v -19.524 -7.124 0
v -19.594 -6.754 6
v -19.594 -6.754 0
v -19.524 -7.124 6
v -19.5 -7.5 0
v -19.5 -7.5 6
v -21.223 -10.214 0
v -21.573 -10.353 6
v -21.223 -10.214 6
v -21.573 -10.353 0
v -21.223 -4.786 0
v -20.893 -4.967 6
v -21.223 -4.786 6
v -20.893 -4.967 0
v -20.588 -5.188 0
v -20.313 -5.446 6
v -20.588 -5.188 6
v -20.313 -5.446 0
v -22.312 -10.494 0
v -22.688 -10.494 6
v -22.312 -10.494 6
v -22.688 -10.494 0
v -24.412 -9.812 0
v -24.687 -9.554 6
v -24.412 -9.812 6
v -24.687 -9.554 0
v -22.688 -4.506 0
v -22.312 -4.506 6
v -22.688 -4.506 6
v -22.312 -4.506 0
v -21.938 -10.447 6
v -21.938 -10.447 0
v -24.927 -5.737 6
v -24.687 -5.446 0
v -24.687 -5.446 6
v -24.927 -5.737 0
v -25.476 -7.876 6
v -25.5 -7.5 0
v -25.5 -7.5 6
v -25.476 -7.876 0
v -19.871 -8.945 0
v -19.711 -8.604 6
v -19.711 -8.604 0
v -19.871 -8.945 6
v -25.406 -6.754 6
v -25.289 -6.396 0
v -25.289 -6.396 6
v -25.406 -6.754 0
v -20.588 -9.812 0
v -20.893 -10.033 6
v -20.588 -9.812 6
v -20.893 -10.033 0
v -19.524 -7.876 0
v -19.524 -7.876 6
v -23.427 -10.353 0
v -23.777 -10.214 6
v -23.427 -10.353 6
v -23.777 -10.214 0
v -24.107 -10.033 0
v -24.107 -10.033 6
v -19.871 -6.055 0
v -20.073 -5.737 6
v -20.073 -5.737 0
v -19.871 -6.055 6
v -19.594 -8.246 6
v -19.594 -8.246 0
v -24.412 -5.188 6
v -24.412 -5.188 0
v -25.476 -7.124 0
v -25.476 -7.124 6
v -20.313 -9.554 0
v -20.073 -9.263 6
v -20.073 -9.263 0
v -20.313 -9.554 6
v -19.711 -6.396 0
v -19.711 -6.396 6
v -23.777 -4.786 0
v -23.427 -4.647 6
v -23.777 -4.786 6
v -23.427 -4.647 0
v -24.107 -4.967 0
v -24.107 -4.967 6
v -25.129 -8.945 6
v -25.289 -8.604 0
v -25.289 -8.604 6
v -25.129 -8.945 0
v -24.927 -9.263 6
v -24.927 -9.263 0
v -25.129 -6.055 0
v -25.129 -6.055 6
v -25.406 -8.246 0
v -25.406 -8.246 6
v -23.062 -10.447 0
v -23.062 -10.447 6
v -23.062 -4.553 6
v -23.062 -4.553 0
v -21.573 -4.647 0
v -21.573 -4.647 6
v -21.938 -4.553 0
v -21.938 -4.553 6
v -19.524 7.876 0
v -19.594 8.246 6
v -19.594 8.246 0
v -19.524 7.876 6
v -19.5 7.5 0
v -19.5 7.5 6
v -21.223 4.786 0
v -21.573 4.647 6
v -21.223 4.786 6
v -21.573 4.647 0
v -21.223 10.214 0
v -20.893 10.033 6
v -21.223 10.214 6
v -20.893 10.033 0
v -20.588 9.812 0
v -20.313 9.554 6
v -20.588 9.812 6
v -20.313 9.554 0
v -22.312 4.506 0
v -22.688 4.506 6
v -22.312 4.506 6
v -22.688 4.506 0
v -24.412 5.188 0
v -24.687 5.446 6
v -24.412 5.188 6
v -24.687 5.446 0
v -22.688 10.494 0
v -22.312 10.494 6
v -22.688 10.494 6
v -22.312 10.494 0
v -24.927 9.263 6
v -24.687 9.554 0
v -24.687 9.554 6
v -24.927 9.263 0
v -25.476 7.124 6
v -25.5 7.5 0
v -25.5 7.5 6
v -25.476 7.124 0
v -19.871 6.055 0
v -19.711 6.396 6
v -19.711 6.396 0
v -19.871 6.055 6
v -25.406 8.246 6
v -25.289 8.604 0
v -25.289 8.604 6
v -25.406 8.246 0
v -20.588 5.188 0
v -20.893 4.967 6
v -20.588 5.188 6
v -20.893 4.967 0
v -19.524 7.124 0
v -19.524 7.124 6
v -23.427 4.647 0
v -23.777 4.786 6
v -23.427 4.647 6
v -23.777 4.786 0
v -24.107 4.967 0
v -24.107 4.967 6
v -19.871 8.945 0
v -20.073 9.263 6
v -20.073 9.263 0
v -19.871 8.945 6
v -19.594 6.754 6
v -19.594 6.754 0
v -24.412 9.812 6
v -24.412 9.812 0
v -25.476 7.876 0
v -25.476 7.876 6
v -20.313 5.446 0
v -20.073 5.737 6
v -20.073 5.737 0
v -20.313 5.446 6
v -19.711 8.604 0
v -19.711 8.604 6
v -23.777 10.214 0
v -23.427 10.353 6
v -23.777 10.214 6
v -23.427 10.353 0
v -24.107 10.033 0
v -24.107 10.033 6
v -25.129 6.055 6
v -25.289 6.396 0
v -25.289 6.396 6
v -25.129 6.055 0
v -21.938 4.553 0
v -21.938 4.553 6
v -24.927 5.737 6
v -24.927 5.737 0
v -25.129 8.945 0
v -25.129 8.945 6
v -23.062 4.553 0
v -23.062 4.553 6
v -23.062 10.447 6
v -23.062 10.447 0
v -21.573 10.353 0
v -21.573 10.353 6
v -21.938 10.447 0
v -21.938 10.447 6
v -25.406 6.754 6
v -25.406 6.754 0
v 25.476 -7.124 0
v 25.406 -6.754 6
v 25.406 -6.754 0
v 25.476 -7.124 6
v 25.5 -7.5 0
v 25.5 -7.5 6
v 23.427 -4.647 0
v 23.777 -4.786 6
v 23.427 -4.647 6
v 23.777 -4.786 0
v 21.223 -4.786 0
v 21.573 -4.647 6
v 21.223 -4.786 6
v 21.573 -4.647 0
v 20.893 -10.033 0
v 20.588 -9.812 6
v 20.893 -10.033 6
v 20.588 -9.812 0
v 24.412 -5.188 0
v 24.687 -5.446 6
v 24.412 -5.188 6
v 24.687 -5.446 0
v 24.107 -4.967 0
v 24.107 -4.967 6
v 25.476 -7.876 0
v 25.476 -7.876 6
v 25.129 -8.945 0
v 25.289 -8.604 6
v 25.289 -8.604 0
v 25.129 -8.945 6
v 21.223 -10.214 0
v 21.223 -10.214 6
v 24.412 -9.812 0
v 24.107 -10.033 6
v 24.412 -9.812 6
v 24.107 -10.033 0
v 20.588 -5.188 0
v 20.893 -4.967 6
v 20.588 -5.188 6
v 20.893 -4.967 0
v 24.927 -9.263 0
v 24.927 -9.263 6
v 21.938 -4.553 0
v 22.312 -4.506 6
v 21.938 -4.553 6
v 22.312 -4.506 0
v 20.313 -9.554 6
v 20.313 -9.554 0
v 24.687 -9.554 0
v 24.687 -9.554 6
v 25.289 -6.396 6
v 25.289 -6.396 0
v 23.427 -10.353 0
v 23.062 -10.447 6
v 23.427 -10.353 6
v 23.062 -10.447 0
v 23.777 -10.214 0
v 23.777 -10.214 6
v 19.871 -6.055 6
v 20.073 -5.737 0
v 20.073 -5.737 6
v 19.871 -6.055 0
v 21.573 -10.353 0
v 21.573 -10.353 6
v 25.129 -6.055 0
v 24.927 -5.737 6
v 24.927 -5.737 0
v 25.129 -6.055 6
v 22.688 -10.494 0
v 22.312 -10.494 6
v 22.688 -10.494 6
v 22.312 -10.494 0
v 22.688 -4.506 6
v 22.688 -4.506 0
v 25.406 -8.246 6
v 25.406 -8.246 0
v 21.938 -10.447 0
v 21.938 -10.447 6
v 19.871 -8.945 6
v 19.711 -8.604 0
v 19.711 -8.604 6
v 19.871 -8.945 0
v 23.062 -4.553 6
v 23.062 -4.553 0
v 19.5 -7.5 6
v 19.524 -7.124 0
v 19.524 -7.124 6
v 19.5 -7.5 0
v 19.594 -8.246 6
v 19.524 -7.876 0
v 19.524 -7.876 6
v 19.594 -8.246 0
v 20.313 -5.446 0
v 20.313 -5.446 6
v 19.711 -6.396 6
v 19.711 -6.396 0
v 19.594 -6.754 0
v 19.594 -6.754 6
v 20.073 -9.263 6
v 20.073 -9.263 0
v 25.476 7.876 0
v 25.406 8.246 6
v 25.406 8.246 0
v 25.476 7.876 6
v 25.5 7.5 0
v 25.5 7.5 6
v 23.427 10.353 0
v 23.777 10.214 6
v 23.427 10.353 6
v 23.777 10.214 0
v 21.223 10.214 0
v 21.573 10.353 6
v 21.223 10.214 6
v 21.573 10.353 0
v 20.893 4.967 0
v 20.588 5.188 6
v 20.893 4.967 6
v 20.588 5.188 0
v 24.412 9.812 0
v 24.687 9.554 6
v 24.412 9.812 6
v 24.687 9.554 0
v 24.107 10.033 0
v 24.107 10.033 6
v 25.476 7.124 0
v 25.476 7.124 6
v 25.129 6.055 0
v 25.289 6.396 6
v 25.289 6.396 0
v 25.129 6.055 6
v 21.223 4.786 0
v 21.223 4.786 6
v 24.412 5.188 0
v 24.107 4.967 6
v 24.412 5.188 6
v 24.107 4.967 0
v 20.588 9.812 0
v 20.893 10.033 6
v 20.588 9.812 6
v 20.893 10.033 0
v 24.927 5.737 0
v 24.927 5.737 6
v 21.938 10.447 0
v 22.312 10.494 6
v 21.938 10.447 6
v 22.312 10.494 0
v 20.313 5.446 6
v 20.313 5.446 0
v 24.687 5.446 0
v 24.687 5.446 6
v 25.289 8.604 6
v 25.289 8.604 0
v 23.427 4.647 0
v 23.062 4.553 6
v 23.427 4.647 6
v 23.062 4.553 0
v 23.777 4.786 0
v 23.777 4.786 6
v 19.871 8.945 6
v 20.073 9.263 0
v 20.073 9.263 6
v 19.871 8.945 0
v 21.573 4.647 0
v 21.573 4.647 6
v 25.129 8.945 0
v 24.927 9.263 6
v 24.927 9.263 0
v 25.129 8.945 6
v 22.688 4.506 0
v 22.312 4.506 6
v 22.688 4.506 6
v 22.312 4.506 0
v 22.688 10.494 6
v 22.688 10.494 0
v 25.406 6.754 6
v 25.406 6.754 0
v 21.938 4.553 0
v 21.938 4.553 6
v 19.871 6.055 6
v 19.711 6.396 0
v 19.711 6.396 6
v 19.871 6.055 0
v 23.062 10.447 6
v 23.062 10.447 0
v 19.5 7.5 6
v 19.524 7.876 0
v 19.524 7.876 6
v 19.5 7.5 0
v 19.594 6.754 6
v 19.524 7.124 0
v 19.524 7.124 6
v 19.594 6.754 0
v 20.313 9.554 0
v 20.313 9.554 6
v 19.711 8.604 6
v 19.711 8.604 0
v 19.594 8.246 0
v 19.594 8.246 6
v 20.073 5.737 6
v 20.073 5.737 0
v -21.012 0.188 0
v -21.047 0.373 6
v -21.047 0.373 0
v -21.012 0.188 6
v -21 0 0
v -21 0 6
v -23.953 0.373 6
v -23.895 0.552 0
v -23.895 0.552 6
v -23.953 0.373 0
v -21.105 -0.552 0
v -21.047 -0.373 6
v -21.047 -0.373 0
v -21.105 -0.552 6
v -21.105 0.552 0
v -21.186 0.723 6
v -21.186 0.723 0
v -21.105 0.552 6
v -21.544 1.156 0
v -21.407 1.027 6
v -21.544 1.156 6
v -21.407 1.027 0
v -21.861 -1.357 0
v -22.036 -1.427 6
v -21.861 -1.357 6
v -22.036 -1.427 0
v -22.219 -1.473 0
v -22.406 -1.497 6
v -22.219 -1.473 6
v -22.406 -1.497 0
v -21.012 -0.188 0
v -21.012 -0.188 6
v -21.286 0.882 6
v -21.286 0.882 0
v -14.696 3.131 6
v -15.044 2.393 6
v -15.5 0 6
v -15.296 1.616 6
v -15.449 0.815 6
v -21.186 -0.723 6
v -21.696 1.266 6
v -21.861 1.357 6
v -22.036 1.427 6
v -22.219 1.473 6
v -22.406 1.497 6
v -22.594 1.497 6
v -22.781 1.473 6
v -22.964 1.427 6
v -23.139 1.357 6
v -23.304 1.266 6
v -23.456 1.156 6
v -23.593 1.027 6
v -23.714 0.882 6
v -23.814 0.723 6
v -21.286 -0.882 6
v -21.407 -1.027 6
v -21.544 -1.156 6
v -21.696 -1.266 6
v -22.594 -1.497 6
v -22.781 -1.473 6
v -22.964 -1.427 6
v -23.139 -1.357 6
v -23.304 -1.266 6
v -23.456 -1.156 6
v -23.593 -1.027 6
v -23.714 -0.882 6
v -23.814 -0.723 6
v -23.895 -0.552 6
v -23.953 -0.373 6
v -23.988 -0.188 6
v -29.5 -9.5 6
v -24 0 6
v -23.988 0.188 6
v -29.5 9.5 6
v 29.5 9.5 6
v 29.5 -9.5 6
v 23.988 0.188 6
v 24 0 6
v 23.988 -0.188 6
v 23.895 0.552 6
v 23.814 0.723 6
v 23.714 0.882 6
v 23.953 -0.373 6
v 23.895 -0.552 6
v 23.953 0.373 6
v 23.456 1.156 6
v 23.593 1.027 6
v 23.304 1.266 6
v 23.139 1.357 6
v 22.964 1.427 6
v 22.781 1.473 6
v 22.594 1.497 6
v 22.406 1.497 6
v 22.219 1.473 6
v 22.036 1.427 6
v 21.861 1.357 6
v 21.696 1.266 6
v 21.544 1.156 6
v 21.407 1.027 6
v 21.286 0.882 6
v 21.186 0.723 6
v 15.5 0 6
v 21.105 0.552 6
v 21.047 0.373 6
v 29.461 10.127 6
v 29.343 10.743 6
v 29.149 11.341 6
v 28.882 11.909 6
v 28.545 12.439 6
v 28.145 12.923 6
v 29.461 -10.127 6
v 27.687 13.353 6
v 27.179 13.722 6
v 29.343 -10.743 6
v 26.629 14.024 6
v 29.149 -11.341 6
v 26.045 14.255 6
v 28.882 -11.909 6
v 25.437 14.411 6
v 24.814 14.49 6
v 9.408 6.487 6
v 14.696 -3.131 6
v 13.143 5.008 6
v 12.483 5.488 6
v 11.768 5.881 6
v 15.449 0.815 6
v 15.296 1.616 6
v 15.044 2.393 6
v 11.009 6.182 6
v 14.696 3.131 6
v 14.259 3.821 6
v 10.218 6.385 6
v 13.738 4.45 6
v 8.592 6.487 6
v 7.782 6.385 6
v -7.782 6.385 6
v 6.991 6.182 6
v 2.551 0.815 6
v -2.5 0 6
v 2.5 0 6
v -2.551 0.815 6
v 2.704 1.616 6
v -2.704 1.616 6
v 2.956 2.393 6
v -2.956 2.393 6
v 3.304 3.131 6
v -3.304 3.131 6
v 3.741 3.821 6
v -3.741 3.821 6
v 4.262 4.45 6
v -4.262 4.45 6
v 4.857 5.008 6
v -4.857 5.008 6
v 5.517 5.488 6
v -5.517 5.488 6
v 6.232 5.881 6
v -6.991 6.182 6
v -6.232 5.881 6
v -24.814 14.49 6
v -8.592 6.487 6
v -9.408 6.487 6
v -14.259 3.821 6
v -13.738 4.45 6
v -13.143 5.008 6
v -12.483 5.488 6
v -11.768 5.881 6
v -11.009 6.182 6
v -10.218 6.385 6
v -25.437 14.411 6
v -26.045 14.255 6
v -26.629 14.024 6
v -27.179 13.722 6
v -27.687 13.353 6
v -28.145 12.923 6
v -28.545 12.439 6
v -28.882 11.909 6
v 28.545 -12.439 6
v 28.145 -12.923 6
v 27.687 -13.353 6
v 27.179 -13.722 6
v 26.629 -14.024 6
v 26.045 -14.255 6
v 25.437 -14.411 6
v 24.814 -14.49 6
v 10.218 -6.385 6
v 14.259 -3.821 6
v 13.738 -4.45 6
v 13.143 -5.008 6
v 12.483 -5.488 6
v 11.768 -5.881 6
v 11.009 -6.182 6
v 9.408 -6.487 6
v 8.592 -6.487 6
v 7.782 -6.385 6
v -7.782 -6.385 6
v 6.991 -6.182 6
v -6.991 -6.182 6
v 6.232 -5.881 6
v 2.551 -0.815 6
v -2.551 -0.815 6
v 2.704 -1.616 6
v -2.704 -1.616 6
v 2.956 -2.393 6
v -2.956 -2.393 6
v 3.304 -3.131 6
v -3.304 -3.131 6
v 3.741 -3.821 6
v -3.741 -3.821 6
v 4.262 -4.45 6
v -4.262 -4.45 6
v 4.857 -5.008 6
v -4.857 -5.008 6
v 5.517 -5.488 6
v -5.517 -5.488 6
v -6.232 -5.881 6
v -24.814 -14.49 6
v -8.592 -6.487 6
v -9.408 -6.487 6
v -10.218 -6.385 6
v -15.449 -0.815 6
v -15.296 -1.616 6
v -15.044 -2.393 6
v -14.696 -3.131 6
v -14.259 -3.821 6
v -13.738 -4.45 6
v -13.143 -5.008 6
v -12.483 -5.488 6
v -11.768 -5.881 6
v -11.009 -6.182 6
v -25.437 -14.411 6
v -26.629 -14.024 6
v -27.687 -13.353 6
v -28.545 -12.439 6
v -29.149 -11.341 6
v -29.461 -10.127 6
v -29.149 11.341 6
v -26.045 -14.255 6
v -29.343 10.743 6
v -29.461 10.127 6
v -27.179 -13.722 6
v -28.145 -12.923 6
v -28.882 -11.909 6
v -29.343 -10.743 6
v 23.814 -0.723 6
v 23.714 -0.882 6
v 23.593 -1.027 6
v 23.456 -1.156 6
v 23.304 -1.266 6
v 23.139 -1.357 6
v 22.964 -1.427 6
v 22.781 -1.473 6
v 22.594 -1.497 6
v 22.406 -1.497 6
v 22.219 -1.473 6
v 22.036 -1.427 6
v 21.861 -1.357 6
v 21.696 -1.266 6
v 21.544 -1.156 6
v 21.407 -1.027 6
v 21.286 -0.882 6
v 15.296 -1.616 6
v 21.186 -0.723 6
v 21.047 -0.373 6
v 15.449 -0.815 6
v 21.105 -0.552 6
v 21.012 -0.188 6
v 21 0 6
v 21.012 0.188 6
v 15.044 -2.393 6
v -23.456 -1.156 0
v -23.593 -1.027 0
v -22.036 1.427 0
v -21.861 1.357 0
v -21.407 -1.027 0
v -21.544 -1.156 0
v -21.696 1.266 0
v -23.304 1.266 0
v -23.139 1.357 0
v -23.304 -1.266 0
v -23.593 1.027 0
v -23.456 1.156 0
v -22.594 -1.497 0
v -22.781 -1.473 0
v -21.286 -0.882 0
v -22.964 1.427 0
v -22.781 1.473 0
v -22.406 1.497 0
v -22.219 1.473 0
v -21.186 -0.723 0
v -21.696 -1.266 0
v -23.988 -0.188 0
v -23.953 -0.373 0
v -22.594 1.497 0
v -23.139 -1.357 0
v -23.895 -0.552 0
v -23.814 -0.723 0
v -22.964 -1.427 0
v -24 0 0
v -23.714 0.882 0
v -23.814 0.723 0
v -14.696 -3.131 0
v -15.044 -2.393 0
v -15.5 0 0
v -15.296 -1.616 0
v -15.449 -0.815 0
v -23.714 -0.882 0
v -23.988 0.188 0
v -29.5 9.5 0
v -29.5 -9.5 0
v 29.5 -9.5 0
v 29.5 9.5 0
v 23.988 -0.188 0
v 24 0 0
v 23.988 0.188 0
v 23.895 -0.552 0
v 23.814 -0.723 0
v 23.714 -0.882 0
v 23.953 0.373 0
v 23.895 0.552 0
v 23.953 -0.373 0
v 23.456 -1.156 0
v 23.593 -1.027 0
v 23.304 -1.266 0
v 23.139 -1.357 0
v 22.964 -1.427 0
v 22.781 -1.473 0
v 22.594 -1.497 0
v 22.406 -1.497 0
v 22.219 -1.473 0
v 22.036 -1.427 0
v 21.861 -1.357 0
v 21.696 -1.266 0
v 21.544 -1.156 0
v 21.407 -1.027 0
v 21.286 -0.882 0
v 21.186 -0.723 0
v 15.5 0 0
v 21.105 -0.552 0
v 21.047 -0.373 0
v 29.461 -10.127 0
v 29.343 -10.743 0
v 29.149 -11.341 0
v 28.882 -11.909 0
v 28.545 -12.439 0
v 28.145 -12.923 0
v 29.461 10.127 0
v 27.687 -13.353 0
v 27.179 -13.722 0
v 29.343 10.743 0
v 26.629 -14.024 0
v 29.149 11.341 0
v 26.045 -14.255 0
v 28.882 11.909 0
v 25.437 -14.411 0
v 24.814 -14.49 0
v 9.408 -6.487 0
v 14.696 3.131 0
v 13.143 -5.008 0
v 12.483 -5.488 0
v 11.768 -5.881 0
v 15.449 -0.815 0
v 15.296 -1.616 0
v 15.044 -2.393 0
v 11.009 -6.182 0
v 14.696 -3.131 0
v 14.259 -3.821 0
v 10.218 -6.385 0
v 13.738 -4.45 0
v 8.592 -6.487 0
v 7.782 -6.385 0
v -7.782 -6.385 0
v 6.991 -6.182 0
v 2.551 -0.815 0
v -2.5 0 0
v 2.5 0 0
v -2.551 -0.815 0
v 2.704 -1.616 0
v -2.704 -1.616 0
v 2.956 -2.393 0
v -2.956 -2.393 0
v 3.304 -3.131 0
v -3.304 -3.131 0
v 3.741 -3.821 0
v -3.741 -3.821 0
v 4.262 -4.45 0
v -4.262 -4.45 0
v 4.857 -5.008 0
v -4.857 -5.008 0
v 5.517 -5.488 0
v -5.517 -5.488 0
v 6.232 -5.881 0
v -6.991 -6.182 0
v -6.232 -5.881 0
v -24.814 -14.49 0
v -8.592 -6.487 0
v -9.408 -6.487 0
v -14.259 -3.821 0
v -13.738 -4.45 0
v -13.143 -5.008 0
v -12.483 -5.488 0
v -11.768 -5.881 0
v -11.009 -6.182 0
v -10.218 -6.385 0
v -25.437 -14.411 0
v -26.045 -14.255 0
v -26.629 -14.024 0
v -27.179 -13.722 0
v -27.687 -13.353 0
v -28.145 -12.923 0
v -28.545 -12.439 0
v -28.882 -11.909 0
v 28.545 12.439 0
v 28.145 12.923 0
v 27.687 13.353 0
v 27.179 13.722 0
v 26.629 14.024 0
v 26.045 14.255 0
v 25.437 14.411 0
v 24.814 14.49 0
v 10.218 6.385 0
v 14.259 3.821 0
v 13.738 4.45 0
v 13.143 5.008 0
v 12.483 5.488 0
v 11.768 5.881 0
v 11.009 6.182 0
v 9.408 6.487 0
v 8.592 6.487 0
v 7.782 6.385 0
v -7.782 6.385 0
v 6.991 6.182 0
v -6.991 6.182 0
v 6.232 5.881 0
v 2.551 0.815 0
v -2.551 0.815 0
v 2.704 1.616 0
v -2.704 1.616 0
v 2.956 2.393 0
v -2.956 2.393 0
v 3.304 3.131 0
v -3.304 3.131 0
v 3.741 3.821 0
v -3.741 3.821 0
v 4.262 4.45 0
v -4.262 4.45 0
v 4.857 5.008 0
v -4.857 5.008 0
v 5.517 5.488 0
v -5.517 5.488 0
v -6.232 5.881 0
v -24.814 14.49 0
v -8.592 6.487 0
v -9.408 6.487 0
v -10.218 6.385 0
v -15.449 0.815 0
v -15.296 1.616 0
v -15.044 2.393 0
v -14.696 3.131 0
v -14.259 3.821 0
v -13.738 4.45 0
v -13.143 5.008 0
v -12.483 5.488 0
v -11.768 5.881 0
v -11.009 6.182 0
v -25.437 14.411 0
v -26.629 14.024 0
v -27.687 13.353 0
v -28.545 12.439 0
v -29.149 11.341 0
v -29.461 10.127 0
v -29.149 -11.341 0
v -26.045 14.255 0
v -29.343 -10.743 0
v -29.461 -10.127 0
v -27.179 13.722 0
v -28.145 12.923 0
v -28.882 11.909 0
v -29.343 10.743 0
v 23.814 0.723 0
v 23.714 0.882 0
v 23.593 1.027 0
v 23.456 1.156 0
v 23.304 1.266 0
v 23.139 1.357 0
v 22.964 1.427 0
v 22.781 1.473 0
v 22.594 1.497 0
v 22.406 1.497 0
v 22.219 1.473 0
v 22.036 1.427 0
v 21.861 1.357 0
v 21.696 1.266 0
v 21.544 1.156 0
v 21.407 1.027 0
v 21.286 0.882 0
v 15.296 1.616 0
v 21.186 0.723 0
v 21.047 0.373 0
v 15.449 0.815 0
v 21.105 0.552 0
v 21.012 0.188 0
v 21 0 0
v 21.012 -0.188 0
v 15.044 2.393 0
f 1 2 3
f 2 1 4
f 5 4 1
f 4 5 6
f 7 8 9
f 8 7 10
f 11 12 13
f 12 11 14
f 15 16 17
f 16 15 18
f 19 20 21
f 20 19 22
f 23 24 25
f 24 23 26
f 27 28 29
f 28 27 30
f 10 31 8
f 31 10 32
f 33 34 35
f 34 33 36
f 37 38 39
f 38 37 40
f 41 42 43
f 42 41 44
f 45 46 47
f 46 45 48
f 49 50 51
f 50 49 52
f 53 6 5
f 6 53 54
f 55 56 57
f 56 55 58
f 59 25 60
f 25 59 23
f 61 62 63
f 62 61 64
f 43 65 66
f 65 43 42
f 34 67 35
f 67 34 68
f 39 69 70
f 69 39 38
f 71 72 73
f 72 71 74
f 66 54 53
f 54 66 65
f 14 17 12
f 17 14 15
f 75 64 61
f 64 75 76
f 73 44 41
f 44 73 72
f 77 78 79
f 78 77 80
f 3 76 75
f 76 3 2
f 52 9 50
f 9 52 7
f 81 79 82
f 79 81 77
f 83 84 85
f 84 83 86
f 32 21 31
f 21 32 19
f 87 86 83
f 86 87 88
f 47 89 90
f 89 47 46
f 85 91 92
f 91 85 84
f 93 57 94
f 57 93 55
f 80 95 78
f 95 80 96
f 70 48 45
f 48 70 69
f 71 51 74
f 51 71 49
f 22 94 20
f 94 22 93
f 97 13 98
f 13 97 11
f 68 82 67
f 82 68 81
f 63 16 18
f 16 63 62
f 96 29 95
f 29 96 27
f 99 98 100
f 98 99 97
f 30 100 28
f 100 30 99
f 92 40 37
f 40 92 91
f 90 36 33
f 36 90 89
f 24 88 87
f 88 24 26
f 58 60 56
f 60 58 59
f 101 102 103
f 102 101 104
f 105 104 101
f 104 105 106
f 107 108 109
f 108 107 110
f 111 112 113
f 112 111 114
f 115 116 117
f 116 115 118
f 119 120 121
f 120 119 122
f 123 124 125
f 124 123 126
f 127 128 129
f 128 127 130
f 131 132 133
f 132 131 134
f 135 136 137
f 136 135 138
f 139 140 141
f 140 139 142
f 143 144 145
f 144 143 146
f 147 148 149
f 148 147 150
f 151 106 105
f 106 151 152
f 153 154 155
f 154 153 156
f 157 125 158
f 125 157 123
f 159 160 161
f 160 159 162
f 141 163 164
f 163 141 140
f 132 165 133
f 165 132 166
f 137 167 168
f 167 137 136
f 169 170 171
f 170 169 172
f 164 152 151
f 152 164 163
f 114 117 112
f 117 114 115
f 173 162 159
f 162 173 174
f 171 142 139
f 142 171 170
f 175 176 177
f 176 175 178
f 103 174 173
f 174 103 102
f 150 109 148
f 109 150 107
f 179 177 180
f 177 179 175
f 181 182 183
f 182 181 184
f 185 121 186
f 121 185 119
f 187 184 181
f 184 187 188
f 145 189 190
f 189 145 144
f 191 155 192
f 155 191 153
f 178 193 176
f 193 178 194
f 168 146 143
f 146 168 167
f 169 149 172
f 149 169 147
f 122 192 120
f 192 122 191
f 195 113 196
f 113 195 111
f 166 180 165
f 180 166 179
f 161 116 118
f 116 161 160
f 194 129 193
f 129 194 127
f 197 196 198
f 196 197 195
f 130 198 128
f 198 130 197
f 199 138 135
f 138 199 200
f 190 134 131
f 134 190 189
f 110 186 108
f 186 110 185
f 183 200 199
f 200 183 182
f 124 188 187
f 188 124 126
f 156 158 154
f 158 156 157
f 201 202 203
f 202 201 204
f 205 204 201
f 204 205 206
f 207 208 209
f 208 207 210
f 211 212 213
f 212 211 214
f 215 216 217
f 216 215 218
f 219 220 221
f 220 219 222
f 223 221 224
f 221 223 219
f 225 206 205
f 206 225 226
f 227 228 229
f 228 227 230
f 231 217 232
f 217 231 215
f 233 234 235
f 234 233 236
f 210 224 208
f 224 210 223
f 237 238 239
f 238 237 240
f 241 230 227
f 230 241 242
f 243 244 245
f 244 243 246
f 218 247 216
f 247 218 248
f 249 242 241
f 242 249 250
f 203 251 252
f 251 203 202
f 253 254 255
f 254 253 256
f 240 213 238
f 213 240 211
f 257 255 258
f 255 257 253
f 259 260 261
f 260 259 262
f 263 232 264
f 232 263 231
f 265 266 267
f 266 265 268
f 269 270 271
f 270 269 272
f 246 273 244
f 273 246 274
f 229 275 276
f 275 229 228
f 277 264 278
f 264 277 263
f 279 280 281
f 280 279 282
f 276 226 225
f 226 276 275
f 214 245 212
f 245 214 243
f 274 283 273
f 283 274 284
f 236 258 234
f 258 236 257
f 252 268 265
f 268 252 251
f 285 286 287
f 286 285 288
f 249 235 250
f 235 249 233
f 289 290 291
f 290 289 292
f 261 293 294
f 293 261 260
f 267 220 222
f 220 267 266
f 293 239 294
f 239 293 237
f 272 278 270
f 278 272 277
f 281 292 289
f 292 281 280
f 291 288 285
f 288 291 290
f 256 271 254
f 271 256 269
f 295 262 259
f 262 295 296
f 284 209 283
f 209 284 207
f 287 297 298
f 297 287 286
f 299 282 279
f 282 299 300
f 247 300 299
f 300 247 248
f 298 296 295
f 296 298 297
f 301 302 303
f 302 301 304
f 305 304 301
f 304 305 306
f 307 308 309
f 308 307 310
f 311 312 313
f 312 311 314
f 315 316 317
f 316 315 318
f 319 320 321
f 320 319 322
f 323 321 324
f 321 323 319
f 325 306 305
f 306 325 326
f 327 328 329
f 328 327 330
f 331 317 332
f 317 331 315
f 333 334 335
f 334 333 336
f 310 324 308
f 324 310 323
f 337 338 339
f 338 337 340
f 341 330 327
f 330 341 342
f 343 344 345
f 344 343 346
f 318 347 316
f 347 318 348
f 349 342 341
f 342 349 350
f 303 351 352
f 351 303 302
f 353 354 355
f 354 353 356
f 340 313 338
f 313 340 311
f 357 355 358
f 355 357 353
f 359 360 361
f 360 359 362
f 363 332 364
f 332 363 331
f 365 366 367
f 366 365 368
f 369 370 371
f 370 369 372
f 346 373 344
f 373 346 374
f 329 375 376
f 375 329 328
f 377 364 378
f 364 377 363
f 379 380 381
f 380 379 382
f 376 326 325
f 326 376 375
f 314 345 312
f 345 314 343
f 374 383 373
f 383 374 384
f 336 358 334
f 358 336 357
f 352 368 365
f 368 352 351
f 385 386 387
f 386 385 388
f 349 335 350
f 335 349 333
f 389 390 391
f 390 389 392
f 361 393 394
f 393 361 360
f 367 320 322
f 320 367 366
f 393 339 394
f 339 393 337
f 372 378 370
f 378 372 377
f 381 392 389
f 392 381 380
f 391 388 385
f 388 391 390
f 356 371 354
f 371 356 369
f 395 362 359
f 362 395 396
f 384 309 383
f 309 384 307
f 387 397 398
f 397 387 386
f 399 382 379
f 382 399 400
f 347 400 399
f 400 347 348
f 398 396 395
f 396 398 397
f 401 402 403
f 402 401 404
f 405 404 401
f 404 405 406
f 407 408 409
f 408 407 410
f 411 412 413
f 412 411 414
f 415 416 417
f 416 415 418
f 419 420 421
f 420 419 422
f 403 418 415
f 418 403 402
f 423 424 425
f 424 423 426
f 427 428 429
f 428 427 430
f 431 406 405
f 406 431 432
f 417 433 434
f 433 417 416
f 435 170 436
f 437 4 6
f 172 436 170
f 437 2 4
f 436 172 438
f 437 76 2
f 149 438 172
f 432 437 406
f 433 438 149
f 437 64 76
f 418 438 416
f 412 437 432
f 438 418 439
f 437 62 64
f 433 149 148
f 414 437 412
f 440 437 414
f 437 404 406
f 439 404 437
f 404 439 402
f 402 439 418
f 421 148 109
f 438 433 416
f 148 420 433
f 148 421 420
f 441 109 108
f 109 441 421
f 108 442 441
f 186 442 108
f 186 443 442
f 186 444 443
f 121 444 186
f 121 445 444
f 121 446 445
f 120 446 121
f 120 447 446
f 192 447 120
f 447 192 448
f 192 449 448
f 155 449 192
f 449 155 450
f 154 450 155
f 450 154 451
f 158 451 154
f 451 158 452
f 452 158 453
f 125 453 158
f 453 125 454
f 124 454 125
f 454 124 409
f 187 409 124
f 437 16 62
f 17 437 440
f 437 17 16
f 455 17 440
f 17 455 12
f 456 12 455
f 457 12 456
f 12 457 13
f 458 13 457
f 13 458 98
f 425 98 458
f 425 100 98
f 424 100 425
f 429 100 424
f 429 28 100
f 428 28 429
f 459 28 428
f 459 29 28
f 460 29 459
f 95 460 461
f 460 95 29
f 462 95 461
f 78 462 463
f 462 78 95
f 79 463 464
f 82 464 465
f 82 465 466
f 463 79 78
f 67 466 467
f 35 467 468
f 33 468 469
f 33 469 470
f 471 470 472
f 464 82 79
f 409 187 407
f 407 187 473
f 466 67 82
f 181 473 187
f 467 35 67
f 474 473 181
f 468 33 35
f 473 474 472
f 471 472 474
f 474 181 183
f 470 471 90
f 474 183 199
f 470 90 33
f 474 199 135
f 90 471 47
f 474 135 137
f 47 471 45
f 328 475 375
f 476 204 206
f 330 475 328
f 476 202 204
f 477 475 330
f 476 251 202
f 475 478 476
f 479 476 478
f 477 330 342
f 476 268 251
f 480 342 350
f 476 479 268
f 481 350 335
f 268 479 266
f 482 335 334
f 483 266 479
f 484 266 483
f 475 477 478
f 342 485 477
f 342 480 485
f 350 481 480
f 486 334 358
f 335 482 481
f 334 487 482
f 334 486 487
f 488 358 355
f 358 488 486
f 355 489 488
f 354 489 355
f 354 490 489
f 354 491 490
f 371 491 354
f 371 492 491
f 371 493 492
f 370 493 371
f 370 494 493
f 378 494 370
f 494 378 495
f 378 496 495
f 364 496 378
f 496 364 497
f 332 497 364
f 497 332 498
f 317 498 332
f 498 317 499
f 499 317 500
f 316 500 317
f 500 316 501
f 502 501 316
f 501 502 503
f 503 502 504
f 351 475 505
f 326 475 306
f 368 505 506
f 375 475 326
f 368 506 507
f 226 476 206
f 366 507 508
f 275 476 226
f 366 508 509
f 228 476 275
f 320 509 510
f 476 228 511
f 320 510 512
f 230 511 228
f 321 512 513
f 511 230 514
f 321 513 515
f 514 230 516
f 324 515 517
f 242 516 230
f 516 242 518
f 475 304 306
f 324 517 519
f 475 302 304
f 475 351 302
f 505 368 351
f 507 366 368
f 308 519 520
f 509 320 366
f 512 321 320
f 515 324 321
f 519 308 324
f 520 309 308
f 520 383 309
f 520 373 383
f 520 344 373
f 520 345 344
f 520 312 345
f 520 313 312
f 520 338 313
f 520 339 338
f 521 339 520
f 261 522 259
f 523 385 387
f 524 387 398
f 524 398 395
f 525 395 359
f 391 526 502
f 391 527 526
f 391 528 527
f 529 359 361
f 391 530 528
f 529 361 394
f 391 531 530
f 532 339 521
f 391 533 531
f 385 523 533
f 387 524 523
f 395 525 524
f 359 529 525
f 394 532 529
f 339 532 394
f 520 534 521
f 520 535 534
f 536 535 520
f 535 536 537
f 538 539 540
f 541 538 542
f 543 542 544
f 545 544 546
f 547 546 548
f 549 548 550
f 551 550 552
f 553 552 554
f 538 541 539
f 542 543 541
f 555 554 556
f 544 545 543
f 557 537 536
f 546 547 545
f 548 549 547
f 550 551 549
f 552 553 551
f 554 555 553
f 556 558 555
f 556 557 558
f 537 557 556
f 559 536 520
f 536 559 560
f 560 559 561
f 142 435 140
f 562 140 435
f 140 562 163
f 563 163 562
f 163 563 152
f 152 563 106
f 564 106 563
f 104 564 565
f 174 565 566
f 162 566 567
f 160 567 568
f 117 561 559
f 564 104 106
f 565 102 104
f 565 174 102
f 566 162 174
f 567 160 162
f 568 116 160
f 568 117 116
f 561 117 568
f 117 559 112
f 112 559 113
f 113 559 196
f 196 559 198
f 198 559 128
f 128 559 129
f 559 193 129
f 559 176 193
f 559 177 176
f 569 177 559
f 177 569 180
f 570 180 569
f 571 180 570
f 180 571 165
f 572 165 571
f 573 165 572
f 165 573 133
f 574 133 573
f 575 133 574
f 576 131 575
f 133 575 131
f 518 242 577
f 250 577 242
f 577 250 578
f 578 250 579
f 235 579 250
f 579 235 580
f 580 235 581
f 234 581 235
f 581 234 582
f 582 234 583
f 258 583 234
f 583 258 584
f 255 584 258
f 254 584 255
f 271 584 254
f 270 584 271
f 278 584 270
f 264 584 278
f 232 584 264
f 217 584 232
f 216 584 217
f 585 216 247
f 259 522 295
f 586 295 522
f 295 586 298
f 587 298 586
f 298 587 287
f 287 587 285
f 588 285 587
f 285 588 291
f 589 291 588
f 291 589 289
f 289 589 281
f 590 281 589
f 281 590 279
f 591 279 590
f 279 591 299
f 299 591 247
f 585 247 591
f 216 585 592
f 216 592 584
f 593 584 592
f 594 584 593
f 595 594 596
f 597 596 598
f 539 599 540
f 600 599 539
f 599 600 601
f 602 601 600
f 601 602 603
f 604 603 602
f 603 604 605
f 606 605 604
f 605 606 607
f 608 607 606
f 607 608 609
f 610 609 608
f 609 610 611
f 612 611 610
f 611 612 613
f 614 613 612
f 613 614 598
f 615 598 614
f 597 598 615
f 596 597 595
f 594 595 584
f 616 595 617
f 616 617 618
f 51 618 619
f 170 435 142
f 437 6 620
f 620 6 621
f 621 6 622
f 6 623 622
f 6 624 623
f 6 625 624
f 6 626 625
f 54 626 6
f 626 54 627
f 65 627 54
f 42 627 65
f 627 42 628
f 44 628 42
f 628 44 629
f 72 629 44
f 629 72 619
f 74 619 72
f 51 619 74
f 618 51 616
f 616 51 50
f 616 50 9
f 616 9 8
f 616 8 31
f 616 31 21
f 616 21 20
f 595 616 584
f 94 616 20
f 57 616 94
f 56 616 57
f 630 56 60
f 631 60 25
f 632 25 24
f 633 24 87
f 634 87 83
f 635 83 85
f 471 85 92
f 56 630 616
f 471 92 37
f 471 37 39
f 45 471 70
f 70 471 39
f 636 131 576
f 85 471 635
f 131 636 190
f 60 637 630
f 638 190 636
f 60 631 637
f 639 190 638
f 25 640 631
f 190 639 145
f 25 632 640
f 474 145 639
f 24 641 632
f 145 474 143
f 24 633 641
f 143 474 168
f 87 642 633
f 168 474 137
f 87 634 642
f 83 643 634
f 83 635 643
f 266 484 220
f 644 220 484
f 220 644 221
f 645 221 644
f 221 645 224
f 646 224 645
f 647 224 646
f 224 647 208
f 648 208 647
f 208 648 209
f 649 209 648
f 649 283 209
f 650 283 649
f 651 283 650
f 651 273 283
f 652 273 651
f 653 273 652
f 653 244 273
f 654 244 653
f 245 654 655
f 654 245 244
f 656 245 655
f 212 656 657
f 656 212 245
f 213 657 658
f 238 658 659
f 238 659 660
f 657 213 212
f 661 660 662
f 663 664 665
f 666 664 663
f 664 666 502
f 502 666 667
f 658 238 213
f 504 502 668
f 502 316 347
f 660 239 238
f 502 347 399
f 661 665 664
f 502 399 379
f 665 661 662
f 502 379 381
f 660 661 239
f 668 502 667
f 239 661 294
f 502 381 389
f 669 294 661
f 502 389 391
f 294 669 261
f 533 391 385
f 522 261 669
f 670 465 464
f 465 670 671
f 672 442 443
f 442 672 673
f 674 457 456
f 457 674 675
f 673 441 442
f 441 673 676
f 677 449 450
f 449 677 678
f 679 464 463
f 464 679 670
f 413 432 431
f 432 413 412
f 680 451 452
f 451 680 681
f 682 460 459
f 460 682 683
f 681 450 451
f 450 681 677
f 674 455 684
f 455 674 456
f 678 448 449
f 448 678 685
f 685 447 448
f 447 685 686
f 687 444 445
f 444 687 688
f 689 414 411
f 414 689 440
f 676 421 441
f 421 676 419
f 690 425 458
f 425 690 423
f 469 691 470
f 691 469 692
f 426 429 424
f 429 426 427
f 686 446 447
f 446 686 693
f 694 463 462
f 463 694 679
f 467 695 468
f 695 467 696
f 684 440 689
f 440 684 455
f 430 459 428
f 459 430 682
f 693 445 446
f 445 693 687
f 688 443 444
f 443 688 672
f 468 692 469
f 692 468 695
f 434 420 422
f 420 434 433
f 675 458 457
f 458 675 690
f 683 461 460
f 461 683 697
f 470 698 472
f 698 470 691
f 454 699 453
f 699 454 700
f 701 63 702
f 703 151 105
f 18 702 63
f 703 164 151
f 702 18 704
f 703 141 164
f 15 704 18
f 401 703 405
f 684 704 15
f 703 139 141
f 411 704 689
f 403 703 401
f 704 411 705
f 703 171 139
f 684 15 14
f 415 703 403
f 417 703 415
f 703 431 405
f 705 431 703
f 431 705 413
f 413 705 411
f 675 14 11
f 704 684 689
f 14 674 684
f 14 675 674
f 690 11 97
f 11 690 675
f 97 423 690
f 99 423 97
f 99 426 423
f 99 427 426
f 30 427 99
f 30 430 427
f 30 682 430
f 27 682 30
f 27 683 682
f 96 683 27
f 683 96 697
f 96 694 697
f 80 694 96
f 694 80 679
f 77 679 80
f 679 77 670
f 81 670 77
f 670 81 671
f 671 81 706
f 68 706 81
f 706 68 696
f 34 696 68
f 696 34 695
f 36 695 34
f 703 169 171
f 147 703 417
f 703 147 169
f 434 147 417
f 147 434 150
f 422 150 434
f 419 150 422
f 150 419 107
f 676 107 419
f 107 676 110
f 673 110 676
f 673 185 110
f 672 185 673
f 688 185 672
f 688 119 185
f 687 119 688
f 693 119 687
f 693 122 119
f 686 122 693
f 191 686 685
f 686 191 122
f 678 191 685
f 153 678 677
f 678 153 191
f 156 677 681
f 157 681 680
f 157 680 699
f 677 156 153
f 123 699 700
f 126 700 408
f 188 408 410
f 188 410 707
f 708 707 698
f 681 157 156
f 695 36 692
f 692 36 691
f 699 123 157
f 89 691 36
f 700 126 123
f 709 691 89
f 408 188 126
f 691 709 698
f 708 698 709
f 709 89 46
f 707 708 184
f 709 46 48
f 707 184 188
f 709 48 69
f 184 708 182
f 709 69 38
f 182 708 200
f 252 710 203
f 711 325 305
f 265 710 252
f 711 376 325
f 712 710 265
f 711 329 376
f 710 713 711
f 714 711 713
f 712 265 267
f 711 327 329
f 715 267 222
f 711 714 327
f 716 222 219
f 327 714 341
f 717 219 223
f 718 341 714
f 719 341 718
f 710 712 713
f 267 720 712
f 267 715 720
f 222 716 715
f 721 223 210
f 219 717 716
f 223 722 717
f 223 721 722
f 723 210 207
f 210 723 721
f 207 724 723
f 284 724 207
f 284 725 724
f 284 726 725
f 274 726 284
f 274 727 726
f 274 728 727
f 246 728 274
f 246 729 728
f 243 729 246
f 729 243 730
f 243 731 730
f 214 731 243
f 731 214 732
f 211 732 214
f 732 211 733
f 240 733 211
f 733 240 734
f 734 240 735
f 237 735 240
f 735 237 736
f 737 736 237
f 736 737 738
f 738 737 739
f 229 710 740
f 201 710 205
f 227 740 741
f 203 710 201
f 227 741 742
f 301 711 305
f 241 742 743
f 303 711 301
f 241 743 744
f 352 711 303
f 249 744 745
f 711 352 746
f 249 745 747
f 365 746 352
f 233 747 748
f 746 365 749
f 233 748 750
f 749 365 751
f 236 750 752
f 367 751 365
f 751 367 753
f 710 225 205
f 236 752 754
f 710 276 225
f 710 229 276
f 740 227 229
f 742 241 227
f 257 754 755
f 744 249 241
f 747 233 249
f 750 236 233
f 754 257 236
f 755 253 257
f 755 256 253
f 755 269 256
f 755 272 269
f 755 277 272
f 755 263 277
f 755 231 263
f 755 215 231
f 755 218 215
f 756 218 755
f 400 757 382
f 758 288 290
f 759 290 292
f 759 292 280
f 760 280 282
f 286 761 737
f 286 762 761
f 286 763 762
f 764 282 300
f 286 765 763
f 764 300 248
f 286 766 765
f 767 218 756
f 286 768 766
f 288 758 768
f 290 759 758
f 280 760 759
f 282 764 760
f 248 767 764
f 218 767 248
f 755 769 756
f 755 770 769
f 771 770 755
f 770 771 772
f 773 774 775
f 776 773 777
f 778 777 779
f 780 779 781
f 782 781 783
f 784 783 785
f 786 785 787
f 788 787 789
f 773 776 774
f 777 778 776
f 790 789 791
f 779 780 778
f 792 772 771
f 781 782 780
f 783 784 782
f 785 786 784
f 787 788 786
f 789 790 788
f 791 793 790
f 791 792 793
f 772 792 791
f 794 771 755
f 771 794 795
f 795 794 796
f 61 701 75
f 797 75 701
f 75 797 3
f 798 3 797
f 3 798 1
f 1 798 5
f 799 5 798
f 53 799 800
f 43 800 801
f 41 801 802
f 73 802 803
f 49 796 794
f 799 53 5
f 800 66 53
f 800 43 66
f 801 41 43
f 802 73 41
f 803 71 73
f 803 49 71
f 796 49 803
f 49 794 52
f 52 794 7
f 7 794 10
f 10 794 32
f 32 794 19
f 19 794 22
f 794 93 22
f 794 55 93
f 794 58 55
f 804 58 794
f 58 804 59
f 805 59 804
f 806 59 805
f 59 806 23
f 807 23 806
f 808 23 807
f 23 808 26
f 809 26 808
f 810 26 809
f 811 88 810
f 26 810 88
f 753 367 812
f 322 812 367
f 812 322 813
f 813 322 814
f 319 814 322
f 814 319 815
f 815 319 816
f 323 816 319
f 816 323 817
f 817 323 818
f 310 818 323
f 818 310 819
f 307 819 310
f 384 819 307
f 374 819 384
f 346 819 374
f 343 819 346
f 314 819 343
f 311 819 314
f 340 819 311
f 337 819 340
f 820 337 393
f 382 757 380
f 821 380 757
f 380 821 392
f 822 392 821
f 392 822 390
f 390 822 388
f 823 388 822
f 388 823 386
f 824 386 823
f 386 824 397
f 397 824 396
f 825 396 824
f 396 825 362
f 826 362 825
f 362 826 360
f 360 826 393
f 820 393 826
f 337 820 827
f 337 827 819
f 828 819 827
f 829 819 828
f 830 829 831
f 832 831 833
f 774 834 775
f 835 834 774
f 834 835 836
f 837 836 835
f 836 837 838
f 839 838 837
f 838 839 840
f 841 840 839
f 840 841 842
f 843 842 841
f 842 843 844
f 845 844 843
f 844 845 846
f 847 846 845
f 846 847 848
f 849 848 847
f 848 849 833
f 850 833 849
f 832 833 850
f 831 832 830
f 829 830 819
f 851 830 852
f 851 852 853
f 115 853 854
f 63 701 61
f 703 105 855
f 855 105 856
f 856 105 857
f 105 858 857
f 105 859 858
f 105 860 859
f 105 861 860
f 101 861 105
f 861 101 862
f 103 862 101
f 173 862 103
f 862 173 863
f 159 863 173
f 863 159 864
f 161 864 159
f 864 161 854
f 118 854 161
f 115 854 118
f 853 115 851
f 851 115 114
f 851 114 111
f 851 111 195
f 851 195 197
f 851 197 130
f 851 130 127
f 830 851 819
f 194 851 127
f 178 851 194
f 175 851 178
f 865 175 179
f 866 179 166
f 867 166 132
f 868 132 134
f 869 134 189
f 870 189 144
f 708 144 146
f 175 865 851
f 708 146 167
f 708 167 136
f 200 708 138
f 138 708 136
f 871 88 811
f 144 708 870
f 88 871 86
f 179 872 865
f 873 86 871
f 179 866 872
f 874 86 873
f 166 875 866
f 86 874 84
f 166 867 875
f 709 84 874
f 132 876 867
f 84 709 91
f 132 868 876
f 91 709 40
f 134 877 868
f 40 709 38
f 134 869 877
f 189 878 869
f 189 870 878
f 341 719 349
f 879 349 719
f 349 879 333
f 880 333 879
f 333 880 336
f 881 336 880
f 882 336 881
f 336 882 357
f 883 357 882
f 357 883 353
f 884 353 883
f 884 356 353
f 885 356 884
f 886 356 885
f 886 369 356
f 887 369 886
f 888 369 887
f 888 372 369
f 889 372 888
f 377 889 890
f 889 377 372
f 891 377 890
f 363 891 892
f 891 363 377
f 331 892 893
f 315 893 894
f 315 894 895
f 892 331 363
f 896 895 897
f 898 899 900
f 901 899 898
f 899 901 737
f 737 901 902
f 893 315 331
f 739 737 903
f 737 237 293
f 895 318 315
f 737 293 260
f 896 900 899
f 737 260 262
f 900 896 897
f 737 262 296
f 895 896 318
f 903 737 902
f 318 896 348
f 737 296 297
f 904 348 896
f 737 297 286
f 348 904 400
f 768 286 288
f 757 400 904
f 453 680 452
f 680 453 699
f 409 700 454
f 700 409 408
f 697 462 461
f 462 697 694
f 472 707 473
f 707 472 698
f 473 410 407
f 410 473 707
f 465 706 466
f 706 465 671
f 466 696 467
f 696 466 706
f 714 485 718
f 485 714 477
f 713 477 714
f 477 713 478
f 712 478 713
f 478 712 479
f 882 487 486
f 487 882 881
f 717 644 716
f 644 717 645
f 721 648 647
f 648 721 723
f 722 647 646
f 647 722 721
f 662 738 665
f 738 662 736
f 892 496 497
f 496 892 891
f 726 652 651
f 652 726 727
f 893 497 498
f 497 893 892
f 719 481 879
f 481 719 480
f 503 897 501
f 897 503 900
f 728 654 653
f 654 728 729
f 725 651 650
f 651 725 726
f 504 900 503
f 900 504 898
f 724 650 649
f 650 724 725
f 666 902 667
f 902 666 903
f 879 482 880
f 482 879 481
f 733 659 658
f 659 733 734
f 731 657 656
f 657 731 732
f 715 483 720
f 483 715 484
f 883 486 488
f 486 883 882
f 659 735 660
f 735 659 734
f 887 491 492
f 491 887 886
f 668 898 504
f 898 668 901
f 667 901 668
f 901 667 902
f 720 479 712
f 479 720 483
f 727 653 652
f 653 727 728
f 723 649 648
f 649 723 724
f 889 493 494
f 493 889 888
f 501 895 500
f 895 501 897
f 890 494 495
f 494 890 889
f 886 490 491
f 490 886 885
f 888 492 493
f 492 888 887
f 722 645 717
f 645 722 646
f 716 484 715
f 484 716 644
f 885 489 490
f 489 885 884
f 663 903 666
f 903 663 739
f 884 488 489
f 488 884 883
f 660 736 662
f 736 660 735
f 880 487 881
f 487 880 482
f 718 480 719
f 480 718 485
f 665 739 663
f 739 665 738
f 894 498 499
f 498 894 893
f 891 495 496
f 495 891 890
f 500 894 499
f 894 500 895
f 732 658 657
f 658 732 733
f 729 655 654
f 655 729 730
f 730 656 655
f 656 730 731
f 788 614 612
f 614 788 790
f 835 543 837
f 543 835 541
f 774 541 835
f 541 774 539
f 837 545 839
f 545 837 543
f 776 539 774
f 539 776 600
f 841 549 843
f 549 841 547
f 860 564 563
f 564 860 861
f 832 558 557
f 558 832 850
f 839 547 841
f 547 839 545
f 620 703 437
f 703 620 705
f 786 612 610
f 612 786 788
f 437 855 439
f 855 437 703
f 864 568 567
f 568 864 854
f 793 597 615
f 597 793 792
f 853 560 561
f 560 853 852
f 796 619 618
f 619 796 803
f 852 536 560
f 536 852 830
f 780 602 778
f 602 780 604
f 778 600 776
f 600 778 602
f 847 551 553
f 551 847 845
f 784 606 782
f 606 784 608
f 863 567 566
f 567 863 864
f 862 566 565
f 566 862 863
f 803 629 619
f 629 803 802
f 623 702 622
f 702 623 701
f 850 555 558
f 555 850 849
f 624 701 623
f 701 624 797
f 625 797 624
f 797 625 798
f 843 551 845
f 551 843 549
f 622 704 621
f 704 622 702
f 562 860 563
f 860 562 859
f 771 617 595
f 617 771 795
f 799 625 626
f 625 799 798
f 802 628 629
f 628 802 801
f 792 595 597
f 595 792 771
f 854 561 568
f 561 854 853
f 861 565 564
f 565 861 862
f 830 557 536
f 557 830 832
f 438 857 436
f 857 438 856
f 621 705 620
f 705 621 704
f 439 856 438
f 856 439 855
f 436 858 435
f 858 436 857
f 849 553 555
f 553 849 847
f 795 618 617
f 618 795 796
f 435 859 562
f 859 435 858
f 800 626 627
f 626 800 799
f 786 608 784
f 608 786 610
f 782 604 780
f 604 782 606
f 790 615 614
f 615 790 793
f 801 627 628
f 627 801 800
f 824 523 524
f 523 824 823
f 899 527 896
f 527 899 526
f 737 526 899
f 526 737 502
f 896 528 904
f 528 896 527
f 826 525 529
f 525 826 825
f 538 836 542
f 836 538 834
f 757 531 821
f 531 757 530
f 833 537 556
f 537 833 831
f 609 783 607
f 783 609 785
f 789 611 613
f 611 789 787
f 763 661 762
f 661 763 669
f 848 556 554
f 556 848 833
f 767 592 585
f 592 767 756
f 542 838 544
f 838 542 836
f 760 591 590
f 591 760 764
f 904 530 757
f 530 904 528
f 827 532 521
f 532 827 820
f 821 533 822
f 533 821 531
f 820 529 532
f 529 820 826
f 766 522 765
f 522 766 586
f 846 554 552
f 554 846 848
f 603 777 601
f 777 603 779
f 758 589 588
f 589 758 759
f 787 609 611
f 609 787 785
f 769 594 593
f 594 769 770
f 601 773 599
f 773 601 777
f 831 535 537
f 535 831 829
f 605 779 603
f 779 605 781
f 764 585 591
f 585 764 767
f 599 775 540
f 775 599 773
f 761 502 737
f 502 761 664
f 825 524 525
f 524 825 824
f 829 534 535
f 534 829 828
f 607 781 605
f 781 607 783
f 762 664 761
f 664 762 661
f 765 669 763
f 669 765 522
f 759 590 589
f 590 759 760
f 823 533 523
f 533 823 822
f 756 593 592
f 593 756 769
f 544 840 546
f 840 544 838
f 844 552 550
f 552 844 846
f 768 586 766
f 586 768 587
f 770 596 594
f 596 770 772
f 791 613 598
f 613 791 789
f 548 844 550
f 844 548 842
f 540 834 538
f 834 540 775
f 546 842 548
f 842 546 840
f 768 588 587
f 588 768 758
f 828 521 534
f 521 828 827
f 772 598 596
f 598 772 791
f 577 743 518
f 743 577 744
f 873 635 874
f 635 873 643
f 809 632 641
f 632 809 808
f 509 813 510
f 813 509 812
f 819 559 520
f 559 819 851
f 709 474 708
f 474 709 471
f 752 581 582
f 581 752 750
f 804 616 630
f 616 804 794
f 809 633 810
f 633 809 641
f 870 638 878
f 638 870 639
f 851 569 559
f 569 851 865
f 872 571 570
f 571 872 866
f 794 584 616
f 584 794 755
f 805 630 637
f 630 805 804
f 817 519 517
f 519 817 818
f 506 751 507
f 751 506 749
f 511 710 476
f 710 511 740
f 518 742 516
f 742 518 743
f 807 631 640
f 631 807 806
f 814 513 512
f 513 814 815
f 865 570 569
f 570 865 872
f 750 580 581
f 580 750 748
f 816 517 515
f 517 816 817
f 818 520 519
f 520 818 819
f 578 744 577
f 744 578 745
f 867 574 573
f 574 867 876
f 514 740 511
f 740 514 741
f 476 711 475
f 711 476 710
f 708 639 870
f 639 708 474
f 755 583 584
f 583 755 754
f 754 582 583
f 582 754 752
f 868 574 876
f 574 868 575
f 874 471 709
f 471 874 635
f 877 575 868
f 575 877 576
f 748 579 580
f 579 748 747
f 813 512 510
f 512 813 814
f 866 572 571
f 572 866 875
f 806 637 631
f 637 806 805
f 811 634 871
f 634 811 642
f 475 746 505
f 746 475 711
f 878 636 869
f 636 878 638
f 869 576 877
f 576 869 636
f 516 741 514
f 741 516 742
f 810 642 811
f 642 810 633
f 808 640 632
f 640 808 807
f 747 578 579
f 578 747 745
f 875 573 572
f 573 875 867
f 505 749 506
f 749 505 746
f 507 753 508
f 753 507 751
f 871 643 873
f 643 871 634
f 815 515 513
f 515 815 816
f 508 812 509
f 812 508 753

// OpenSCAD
$fn = 50;


difference() {
	union() {
		hull() {
			translate(v = [-24.5000000000, 9.5000000000, 0]) {
				cylinder(h = 6, r = 5);
			}
			translate(v = [24.5000000000, 9.5000000000, 0]) {
				cylinder(h = 6, r = 5);
			}
			translate(v = [-24.5000000000, -9.5000000000, 0]) {
				cylinder(h = 6, r = 5);
			}
			translate(v = [24.5000000000, -9.5000000000, 0]) {
				cylinder(h = 6, r = 5);
			}
		}
	}
	union() {
		#translate(v = [-22.5000000000, -7.5000000000, 0]) {
			cylinder(h = 6, r = 3.0000000000);
		}
		#translate(v = [-22.5000000000, 7.5000000000, 0]) {
			cylinder(h = 6, r = 3.0000000000);
		}
		#translate(v = [22.5000000000, -7.5000000000, 0]) {
			cylinder(h = 6, r = 3.0000000000);
		}
		#translate(v = [22.5000000000, 7.5000000000, 0]) {
			cylinder(h = 6, r = 3.0000000000);
		}
		#translate(v = [-22.5000000000, -7.5000000000, -100.0000000000]) {
			cylinder(h = 200, r = 3.0000000000);
		}
		#translate(v = [-22.5000000000, 7.5000000000, -100.0000000000]) {
			cylinder(h = 200, r = 3.0000000000);
		}
		#translate(v = [22.5000000000, -7.5000000000, -100.0000000000]) {
			cylinder(h = 200, r = 3.0000000000);
		}
		#translate(v = [22.5000000000, 7.5000000000, -100.0000000000]) {
			cylinder(h = 200, r = 3.0000000000);
		}
		#translate(v = [-22.5000000000, -7.5000000000, 0]) {
			cylinder(h = 6, r = 1.5000000000);
		}
		#translate(v = [-22.5000000000, 0.0000000000, 0]) {
			cylinder(h = 6, r = 1.5000000000);
		}
		#translate(v = [-22.5000000000, 7.5000000000, 0]) {
			cylinder(h = 6, r = 1.5000000000);
		}
		#translate(v = [22.5000000000, -7.5000000000, 0]) {
			cylinder(h = 6, r = 1.5000000000);
		}
		#translate(v = [22.5000000000, 0.0000000000, 0]) {
			cylinder(h = 6, r = 1.5000000000);
		}
		#translate(v = [22.5000000000, 7.5000000000, 0]) {
			cylinder(h = 6, r = 1.5000000000);
		}
		#translate(v = [-22.5000000000, -7.5000000000, 0]) {
			cylinder(h = 6, r = 1.5000000000);
		}
		#translate(v = [-22.5000000000, 0.0000000000, 0]) {
			cylinder(h = 6, r = 1.5000000000);
		}
		#translate(v = [-22.5000000000, 7.5000000000, 0]) {
			cylinder(h = 6, r = 1.5000000000);
		}
		#translate(v = [22.5000000000, -7.5000000000, 0]) {
			cylinder(h = 6, r = 1.5000000000);
		}
		#translate(v = [22.5000000000, 0.0000000000, 0]) {
			cylinder(h = 6, r = 1.5000000000);
		}
		#translate(v = [22.5000000000, 7.5000000000, 0]) {
			cylinder(h = 6, r = 1.5000000000);
		}
		#translate(v = [-22.5000000000, -7.5000000000, 0]) {
			cylinder(h = 6, r = 1.5000000000);
		}
		#translate(v = [-22.5000000000, 0.0000000000, 0]) {
			cylinder(h = 6, r = 1.5000000000);
		}
		#translate(v = [-22.5000000000, 7.5000000000, 0]) {
			cylinder(h = 6, r = 1.5000000000);
		}
		#translate(v = [22.5000000000, -7.5000000000, 0]) {
			cylinder(h = 6, r = 1.5000000000);
		}
		#translate(v = [22.5000000000, 0.0000000000, 0]) {
			cylinder(h = 6, r = 1.5000000000);
		}
		#translate(v = [22.5000000000, 7.5000000000, 0]) {
			cylinder(h = 6, r = 1.5000000000);
		}
		#translate(v = [-9.0000000000, 0, 0]) {
			cylinder(h = 6, r = 6.5000000000);
		}
		#translate(v = [9.0000000000, 0, 0]) {
			cylinder(h = 6, r = 6.5000000000);
		}
	}
}
